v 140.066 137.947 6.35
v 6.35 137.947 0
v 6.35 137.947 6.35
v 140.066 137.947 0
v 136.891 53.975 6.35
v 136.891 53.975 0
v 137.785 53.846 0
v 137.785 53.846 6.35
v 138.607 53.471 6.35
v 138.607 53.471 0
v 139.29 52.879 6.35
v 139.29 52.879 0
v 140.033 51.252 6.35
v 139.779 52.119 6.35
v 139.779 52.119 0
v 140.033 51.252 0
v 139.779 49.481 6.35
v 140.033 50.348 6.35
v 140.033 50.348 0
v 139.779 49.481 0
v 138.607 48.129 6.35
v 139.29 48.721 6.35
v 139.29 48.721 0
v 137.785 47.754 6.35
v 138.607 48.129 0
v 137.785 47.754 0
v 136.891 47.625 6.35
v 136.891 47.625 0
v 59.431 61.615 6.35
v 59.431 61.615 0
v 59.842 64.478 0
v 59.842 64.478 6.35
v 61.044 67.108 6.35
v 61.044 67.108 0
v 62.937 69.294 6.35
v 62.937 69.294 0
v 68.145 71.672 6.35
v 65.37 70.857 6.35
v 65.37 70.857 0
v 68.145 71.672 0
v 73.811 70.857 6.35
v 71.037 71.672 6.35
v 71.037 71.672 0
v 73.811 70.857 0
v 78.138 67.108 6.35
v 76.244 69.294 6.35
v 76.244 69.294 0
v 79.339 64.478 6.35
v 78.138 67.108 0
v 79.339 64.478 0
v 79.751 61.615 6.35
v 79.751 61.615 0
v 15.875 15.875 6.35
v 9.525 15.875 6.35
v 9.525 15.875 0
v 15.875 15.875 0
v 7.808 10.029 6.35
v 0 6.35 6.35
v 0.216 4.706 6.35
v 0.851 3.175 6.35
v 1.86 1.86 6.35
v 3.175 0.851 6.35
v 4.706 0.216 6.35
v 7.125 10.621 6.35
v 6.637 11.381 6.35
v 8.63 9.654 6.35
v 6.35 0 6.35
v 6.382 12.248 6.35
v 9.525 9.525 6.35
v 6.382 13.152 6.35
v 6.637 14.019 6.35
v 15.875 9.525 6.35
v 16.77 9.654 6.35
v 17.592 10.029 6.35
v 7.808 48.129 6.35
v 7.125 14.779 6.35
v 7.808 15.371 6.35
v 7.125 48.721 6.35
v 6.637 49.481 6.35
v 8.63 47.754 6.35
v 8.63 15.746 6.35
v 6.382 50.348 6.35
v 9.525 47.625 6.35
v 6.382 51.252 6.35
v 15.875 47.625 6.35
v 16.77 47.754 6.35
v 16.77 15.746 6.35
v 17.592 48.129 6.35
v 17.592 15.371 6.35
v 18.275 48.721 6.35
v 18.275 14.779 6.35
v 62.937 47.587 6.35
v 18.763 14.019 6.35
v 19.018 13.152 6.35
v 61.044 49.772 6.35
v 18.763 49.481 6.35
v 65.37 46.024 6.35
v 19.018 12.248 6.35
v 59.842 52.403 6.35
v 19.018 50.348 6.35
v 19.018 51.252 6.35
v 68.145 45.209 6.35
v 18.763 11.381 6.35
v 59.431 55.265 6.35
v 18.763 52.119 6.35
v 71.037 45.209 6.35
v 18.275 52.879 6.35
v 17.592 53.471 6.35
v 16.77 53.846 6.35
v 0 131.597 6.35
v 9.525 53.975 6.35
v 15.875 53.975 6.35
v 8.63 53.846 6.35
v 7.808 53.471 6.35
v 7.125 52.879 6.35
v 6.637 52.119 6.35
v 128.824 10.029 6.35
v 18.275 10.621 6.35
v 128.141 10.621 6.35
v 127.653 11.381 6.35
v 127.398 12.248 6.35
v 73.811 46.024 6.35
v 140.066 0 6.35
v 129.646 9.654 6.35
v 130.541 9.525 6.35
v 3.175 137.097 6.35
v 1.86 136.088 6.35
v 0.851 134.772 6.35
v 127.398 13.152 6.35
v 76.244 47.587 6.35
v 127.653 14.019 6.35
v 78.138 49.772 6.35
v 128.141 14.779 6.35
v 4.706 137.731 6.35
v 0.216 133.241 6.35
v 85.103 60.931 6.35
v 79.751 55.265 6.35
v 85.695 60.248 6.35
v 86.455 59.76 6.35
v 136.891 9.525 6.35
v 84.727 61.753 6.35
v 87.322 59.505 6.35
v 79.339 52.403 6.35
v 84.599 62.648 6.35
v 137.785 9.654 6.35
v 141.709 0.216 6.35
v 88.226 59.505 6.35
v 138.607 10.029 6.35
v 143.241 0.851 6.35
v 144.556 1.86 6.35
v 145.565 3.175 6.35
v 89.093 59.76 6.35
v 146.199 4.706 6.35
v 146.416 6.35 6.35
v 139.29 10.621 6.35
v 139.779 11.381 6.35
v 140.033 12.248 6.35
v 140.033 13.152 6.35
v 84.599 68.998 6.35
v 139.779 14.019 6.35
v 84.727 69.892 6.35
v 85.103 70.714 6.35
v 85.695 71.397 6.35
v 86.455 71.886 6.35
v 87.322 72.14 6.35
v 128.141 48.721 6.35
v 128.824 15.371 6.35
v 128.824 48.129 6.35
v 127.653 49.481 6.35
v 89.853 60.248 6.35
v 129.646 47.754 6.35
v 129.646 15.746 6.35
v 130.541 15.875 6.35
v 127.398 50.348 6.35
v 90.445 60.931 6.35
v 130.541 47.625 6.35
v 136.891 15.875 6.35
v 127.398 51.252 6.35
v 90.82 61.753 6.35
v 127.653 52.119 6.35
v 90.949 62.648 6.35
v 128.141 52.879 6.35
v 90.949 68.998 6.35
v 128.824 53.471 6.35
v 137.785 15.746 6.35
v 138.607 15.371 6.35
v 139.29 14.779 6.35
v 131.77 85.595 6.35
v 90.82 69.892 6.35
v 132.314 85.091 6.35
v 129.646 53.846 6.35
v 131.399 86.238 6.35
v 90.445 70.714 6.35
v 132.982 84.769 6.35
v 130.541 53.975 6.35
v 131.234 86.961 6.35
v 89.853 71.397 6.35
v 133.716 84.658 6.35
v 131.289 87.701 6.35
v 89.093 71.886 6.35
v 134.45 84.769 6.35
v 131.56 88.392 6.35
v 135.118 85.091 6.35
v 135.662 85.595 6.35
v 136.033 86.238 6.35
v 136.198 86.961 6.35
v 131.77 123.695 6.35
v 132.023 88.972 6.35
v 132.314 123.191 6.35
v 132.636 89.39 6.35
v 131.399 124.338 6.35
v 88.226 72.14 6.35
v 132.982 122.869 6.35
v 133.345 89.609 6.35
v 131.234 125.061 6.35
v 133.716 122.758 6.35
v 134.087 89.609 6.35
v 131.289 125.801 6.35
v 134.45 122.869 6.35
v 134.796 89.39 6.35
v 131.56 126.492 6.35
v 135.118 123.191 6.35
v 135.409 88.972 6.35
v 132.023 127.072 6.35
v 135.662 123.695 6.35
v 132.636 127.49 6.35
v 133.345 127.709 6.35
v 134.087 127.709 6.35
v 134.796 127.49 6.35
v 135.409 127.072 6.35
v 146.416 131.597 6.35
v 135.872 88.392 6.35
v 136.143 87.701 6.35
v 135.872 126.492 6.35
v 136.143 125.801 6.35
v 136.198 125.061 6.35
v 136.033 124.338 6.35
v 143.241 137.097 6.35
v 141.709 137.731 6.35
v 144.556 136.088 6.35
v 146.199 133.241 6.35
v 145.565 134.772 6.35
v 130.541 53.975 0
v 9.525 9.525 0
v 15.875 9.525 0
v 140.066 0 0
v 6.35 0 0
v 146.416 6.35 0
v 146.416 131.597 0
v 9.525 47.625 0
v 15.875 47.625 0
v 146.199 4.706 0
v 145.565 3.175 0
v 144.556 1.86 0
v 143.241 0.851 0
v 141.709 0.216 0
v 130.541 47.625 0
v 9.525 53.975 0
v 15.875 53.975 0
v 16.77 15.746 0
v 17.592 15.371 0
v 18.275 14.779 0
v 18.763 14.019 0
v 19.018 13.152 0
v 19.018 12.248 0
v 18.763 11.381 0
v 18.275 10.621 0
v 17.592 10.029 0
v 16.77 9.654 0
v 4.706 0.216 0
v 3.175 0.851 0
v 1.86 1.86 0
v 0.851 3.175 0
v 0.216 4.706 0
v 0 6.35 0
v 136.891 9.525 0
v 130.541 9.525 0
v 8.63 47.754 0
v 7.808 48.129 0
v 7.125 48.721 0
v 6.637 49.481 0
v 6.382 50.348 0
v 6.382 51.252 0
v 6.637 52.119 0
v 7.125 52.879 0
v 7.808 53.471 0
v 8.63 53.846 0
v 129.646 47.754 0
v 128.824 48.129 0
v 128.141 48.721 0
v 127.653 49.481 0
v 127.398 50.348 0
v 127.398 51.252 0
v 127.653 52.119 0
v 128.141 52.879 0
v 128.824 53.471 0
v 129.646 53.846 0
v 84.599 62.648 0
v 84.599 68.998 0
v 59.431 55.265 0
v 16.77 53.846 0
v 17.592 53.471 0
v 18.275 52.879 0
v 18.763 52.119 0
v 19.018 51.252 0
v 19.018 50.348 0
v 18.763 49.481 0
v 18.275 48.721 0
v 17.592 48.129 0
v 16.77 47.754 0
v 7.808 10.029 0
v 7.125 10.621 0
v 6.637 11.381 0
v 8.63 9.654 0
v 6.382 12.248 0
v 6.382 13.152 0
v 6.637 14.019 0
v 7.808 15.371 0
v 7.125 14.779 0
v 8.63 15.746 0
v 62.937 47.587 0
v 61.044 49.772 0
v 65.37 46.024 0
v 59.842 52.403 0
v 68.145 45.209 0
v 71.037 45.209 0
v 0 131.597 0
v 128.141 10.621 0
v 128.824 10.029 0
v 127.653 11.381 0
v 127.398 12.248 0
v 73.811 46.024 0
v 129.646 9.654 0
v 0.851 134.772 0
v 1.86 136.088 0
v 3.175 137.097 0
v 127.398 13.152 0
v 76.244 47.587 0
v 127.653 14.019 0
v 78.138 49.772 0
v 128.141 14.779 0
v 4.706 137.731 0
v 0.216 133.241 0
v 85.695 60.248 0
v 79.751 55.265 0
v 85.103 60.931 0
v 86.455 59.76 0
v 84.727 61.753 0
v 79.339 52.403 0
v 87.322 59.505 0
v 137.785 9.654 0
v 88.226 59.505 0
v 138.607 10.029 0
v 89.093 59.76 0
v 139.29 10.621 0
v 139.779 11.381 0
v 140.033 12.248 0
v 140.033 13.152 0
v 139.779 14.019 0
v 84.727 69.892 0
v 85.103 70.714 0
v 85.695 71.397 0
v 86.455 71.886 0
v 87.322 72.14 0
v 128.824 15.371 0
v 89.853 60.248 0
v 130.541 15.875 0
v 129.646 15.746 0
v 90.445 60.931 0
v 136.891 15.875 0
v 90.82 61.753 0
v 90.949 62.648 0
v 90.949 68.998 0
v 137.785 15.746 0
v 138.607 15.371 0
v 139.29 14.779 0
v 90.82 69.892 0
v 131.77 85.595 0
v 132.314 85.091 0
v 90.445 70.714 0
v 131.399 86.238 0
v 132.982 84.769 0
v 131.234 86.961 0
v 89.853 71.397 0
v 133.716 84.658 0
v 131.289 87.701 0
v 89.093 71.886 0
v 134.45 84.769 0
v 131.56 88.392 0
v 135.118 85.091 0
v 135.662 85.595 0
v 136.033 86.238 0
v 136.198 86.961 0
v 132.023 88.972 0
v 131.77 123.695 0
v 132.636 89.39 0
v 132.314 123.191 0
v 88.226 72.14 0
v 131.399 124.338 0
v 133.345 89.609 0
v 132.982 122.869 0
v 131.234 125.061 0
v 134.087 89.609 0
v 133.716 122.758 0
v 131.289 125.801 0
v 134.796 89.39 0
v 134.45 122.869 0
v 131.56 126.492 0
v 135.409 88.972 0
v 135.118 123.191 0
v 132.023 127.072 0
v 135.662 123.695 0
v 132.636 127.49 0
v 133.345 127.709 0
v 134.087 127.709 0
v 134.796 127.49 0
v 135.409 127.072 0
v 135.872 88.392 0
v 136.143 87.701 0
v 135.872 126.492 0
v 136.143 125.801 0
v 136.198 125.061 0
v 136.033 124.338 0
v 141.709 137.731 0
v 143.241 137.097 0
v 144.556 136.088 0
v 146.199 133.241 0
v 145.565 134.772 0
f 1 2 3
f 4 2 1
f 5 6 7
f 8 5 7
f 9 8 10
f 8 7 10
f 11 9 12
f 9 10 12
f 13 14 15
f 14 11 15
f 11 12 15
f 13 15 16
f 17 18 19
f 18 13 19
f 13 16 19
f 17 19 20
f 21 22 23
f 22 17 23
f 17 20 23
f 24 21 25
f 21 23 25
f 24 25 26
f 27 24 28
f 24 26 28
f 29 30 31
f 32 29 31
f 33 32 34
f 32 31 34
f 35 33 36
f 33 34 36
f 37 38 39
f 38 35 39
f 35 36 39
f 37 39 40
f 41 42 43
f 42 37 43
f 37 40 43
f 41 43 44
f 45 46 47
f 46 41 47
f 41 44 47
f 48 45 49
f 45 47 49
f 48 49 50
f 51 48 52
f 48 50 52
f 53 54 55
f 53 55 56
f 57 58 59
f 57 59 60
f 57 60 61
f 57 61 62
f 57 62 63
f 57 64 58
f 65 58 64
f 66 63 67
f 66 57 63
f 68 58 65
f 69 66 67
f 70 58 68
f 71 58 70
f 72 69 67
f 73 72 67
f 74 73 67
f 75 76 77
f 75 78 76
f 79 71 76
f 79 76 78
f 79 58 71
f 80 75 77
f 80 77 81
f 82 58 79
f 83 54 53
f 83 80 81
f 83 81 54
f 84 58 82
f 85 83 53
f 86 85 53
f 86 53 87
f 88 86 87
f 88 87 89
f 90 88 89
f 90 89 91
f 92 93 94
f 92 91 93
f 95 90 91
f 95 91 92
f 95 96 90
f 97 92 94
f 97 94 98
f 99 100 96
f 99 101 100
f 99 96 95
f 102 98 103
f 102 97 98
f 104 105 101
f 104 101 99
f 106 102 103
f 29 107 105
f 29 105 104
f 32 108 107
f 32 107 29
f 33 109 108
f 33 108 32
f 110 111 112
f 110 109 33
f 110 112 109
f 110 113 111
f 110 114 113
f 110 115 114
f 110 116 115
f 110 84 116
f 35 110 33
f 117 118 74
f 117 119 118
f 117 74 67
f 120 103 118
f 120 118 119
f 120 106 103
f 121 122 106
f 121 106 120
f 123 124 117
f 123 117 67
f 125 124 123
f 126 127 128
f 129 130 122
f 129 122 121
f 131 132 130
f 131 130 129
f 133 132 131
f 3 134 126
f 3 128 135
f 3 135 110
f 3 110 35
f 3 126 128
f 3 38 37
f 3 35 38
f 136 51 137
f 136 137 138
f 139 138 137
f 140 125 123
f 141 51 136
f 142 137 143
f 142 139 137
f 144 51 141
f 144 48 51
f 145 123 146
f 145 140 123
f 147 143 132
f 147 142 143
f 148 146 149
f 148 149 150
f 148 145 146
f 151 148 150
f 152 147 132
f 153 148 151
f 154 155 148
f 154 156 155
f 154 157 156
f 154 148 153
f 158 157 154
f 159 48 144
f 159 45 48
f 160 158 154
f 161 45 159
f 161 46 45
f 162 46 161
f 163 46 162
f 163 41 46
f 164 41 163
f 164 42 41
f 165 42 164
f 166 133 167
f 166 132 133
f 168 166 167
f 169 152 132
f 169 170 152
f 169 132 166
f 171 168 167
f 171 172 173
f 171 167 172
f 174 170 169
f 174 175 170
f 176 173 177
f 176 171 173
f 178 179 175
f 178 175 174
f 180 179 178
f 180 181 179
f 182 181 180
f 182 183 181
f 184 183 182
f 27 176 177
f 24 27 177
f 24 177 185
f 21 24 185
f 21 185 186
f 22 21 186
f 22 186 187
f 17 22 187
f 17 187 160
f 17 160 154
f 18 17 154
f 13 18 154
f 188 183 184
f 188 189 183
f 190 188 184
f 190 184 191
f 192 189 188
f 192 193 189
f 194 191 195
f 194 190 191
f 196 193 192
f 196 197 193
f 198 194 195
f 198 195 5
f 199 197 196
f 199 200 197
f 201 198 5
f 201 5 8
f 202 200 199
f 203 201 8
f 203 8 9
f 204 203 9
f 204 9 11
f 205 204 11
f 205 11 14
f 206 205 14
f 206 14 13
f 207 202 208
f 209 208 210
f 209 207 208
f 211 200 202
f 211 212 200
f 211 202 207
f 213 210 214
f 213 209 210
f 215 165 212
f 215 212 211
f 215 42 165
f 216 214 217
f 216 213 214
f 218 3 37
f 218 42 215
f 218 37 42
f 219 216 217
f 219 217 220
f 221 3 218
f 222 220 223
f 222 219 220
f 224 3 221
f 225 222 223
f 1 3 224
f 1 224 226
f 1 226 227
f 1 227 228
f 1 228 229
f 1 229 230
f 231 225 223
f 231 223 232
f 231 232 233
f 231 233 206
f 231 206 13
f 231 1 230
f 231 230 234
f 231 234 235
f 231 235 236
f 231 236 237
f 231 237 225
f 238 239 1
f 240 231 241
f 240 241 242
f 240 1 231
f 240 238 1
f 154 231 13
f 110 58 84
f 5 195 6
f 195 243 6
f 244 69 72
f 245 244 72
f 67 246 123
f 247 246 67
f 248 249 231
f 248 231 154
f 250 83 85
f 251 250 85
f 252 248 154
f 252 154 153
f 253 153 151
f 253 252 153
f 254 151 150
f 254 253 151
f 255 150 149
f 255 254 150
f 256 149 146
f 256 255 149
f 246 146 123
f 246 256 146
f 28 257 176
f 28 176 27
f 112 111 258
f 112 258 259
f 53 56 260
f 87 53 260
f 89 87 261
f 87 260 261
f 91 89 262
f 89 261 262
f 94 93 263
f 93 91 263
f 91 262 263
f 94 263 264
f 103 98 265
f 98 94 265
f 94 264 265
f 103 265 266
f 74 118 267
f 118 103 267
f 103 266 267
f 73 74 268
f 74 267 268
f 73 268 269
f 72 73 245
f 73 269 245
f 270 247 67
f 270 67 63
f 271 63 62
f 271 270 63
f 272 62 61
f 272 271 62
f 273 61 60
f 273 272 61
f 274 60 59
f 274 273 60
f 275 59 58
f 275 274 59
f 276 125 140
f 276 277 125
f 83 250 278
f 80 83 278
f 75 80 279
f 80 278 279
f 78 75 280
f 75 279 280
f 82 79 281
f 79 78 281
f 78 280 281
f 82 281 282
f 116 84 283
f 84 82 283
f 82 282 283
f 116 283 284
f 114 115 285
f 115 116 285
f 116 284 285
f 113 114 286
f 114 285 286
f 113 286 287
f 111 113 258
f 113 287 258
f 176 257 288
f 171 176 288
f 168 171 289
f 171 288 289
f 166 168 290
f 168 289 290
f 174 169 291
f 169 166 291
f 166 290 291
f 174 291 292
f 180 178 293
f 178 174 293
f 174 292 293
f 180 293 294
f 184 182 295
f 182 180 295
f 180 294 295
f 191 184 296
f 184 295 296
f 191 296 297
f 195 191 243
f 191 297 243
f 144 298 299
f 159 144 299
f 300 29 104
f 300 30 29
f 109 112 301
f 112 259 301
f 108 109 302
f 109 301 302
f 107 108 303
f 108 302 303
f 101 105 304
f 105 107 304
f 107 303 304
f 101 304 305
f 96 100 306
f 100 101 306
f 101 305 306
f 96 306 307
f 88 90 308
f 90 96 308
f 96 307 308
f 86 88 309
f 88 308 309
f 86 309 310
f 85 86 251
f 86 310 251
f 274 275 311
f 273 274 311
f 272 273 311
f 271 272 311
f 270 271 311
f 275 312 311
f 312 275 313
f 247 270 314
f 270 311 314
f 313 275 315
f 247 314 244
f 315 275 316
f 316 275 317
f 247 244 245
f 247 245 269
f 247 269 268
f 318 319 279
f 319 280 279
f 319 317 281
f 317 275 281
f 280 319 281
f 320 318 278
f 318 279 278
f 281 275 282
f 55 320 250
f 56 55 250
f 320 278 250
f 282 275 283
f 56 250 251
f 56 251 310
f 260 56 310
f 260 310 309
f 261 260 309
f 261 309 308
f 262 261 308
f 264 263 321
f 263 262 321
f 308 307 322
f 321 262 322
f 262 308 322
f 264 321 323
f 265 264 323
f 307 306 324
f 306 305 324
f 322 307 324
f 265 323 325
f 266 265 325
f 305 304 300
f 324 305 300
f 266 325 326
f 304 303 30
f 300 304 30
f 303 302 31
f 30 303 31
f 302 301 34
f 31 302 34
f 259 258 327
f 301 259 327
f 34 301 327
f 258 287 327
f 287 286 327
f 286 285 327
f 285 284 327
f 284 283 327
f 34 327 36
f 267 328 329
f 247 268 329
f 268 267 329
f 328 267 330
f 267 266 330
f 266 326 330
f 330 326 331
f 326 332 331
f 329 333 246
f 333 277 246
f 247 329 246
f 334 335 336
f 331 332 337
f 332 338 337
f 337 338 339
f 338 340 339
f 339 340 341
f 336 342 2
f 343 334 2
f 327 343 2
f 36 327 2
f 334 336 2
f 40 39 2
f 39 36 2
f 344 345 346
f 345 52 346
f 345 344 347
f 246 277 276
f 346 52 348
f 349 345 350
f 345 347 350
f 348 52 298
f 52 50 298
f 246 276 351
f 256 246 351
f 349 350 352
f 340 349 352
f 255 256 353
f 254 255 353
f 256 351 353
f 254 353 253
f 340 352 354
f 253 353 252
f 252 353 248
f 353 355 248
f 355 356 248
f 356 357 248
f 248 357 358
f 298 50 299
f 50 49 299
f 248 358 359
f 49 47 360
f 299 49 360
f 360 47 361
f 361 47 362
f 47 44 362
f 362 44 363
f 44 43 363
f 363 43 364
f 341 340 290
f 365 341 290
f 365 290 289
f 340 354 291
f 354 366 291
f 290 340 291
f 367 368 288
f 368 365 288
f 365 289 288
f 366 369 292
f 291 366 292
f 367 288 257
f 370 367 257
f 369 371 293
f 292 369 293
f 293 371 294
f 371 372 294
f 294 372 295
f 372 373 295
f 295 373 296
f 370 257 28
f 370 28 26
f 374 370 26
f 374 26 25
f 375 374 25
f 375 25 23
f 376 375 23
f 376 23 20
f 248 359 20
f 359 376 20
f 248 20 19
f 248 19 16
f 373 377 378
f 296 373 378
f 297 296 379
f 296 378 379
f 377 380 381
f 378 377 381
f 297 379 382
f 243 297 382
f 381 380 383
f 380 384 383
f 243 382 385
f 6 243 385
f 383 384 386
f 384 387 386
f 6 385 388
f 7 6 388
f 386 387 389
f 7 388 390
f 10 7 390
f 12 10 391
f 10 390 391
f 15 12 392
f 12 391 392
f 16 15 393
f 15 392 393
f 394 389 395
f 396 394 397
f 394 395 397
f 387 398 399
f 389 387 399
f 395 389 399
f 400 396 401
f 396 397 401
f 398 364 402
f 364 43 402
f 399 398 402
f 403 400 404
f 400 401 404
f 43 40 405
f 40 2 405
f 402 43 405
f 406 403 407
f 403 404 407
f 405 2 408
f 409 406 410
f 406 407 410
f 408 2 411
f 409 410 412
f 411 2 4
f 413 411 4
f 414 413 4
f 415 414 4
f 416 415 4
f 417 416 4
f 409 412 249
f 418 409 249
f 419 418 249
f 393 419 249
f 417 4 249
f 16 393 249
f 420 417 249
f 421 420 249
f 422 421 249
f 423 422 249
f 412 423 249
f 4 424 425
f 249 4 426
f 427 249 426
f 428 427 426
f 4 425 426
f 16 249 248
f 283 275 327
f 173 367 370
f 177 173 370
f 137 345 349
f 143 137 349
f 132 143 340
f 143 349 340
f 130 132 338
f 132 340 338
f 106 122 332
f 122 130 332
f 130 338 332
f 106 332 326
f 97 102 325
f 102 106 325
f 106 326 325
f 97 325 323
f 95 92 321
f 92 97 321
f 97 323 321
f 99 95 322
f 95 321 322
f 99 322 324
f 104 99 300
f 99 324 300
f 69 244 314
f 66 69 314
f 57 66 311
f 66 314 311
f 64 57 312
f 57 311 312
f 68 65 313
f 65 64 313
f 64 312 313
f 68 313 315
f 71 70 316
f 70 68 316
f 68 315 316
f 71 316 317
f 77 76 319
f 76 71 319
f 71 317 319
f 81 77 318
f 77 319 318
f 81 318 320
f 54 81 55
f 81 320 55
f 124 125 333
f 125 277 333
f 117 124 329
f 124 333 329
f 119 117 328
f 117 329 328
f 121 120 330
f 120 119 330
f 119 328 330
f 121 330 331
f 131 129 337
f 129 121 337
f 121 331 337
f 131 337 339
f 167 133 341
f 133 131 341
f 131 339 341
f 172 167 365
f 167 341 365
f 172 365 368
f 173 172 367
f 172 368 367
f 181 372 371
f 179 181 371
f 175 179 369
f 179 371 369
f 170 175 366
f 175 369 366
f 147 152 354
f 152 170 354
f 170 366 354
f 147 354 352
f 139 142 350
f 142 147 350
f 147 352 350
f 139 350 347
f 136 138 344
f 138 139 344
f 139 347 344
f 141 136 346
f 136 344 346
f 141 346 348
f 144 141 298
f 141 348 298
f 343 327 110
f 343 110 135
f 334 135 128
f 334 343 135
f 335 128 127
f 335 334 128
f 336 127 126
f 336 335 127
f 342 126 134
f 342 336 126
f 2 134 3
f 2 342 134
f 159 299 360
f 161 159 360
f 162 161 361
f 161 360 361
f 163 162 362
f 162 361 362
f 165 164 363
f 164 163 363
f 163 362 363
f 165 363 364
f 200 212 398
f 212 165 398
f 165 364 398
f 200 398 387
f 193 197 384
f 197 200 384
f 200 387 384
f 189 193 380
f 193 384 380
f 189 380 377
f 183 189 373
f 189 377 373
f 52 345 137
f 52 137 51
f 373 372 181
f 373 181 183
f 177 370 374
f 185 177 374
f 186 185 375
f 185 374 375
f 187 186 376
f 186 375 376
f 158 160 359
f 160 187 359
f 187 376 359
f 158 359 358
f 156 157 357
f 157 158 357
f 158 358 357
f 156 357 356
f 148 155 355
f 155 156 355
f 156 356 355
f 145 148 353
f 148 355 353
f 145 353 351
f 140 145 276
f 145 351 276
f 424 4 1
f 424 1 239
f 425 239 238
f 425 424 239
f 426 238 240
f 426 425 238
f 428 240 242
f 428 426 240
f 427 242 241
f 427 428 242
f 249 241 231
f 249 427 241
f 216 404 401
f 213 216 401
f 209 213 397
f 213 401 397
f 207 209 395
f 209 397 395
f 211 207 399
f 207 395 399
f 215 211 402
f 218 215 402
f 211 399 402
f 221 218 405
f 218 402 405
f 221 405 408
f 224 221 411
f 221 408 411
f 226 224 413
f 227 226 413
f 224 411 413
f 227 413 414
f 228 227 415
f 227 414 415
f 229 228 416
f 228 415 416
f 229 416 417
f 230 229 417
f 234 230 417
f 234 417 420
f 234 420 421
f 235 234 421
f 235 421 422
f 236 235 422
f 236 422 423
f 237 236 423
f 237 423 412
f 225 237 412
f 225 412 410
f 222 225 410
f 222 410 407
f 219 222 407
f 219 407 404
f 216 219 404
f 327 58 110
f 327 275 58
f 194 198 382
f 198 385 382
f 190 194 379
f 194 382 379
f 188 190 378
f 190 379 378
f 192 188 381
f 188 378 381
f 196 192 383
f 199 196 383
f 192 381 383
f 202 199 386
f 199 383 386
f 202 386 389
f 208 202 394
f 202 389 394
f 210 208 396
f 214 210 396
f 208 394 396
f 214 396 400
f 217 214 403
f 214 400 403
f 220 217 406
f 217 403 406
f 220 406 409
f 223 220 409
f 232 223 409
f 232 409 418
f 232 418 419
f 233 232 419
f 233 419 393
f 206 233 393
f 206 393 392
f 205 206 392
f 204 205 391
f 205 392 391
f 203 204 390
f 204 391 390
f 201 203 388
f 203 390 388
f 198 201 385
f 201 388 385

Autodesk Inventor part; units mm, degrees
ref_plane "YZ Plane" through (0, 0, 0) normal (1, 0, 0) x (0, 1, 0)
ref_plane "XZ Plane" through (0, 0, 0) normal (0, 1, 0) x (-1, 0, 0)
ref_plane "XY Plane" through (0, 0, 0) normal (0, 0, 1) x (1, 0, 0)
sketch "Sketch1" plane through (0, 0, 0) normal (0, 0, 1) x (1, 0, 0)
  line L0 (73.2079, 137.9474) -> (121.0158, 137.9474)
  line L1 (133.7158, 0) -> (73.2079, 0)
  line L2 (73.2079, 137.9474) -> (25.4, 137.9474)
  line L3 (25.4, 0) -> (73.2079, 0)
  line L4 (121.0158, 137.9474) -> (140.0658, 137.9474)
  arc A0 (146.4158, 131.5974) -> (140.0658, 137.9474) centre (140.0658, 131.5974) ccw
  line L5 (146.4158, 131.5974) -> (146.4158, 6.35)
  line L6 (25.4, 0) -> (6.35, 0)
  arc A1 (0, 6.35) -> (6.35, 0) centre (6.35, 6.35) ccw
  line L7 (0, 6.35) -> (0, 131.5974)
  arc A2 (6.35, 137.9474) -> (0, 131.5974) centre (6.35, 131.5974) ccw
  line L8 (6.35, 137.9474) -> (25.4, 137.9474)
  line L9 (140.0658, 0) -> (133.7158, 0)
  arc A3 (140.0658, 0) -> (146.4158, 6.35) centre (140.0658, 6.35) ccw
  arc A4 (9.525, 53.975) -> (9.525, 47.625) centre (9.525, 50.8) ccw
  arc A5 (15.875, 47.625) -> (15.875, 53.975) centre (15.875, 50.8) ccw
  line L10 (9.525, 53.975) -> (15.875, 53.975)
  line L11 (9.525, 47.625) -> (15.875, 47.625)
  arc A6 (9.525, 15.875) -> (9.525, 9.525) centre (9.525, 12.7) ccw
  arc A7 (15.875, 9.525) -> (15.875, 15.875) centre (15.875, 12.7) ccw
  line L12 (9.525, 15.875) -> (15.875, 15.875)
  line L13 (9.525, 9.525) -> (15.875, 9.525)
  arc A8 (130.5408, 53.975) -> (130.5408, 47.625) centre (130.5408, 50.8) ccw
  arc A9 (136.8908, 47.625) -> (136.8908, 53.975) centre (136.8908, 50.8) ccw
  line L14 (130.5408, 53.975) -> (136.8908, 53.975)
  line L15 (130.5408, 47.625) -> (136.8908, 47.625)
  arc A10 (130.5408, 15.875) -> (130.5408, 9.525) centre (130.5408, 12.7) ccw
  arc A11 (136.8908, 9.525) -> (136.8908, 15.875) centre (136.8908, 12.7) ccw
  line L16 (130.5408, 15.875) -> (136.8908, 15.875)
  line L17 (130.5408, 9.525) -> (136.8908, 9.525)
  arc A12 (84.5988, 62.6476) -> (90.9488, 62.6476) centre (87.7738, 62.6476) ccw
  arc A13 (90.9488, 68.9976) -> (84.5988, 68.9976) centre (87.7738, 68.9976) ccw
  line L18 (84.5988, 62.6476) -> (84.5988, 68.9976)
  line L19 (90.9488, 62.6476) -> (90.9488, 68.9976)
  circle A14 centre (133.7158, 125.2474) radius 2.54 construction
  circle A15 centre (133.7158, 87.1474) radius 2.54 construction
  arc A16 (79.7508, 61.6154) -> (59.4308, 61.6154) centre (69.5908, 61.6154) ccw
  arc A17 (59.4308, 55.2654) -> (79.7508, 55.2654) centre (69.5908, 55.2654) ccw
  line L20 (79.7508, 55.2654) -> (79.7508, 61.6154)
  line L21 (59.4308, 61.6154) -> (59.4308, 55.2654)
  point P0 (0, 0)
ref_plane "Work Plane1" through (0, 0, 6.35) normal (0, 0, 1) x (1, 0, 0)
sketch "Sketch3" plane through (0, 0, 6.35) normal (0, 0, 1) x (1, 0, 0)
  point P0 (0, 0)
  point P1 (133.7158, 87.1474)
  point P2 (133.7158, 125.2474)
extrude "Extrusion2" add sketch "Sketch1" along normal blind 6.35
hole "Hole1" at (133.7158, 87.1474, 6.35) at (133.7158, 125.2474, 6.35) direction (0, 0, -1) diameter 4.9784 depth 19.05 tip angle 118 thread size "1/4-20 UNC" class "2B" standard "ANSI Unified Screw Threads"
properties part number "vrRig_v01r1_projMount"
